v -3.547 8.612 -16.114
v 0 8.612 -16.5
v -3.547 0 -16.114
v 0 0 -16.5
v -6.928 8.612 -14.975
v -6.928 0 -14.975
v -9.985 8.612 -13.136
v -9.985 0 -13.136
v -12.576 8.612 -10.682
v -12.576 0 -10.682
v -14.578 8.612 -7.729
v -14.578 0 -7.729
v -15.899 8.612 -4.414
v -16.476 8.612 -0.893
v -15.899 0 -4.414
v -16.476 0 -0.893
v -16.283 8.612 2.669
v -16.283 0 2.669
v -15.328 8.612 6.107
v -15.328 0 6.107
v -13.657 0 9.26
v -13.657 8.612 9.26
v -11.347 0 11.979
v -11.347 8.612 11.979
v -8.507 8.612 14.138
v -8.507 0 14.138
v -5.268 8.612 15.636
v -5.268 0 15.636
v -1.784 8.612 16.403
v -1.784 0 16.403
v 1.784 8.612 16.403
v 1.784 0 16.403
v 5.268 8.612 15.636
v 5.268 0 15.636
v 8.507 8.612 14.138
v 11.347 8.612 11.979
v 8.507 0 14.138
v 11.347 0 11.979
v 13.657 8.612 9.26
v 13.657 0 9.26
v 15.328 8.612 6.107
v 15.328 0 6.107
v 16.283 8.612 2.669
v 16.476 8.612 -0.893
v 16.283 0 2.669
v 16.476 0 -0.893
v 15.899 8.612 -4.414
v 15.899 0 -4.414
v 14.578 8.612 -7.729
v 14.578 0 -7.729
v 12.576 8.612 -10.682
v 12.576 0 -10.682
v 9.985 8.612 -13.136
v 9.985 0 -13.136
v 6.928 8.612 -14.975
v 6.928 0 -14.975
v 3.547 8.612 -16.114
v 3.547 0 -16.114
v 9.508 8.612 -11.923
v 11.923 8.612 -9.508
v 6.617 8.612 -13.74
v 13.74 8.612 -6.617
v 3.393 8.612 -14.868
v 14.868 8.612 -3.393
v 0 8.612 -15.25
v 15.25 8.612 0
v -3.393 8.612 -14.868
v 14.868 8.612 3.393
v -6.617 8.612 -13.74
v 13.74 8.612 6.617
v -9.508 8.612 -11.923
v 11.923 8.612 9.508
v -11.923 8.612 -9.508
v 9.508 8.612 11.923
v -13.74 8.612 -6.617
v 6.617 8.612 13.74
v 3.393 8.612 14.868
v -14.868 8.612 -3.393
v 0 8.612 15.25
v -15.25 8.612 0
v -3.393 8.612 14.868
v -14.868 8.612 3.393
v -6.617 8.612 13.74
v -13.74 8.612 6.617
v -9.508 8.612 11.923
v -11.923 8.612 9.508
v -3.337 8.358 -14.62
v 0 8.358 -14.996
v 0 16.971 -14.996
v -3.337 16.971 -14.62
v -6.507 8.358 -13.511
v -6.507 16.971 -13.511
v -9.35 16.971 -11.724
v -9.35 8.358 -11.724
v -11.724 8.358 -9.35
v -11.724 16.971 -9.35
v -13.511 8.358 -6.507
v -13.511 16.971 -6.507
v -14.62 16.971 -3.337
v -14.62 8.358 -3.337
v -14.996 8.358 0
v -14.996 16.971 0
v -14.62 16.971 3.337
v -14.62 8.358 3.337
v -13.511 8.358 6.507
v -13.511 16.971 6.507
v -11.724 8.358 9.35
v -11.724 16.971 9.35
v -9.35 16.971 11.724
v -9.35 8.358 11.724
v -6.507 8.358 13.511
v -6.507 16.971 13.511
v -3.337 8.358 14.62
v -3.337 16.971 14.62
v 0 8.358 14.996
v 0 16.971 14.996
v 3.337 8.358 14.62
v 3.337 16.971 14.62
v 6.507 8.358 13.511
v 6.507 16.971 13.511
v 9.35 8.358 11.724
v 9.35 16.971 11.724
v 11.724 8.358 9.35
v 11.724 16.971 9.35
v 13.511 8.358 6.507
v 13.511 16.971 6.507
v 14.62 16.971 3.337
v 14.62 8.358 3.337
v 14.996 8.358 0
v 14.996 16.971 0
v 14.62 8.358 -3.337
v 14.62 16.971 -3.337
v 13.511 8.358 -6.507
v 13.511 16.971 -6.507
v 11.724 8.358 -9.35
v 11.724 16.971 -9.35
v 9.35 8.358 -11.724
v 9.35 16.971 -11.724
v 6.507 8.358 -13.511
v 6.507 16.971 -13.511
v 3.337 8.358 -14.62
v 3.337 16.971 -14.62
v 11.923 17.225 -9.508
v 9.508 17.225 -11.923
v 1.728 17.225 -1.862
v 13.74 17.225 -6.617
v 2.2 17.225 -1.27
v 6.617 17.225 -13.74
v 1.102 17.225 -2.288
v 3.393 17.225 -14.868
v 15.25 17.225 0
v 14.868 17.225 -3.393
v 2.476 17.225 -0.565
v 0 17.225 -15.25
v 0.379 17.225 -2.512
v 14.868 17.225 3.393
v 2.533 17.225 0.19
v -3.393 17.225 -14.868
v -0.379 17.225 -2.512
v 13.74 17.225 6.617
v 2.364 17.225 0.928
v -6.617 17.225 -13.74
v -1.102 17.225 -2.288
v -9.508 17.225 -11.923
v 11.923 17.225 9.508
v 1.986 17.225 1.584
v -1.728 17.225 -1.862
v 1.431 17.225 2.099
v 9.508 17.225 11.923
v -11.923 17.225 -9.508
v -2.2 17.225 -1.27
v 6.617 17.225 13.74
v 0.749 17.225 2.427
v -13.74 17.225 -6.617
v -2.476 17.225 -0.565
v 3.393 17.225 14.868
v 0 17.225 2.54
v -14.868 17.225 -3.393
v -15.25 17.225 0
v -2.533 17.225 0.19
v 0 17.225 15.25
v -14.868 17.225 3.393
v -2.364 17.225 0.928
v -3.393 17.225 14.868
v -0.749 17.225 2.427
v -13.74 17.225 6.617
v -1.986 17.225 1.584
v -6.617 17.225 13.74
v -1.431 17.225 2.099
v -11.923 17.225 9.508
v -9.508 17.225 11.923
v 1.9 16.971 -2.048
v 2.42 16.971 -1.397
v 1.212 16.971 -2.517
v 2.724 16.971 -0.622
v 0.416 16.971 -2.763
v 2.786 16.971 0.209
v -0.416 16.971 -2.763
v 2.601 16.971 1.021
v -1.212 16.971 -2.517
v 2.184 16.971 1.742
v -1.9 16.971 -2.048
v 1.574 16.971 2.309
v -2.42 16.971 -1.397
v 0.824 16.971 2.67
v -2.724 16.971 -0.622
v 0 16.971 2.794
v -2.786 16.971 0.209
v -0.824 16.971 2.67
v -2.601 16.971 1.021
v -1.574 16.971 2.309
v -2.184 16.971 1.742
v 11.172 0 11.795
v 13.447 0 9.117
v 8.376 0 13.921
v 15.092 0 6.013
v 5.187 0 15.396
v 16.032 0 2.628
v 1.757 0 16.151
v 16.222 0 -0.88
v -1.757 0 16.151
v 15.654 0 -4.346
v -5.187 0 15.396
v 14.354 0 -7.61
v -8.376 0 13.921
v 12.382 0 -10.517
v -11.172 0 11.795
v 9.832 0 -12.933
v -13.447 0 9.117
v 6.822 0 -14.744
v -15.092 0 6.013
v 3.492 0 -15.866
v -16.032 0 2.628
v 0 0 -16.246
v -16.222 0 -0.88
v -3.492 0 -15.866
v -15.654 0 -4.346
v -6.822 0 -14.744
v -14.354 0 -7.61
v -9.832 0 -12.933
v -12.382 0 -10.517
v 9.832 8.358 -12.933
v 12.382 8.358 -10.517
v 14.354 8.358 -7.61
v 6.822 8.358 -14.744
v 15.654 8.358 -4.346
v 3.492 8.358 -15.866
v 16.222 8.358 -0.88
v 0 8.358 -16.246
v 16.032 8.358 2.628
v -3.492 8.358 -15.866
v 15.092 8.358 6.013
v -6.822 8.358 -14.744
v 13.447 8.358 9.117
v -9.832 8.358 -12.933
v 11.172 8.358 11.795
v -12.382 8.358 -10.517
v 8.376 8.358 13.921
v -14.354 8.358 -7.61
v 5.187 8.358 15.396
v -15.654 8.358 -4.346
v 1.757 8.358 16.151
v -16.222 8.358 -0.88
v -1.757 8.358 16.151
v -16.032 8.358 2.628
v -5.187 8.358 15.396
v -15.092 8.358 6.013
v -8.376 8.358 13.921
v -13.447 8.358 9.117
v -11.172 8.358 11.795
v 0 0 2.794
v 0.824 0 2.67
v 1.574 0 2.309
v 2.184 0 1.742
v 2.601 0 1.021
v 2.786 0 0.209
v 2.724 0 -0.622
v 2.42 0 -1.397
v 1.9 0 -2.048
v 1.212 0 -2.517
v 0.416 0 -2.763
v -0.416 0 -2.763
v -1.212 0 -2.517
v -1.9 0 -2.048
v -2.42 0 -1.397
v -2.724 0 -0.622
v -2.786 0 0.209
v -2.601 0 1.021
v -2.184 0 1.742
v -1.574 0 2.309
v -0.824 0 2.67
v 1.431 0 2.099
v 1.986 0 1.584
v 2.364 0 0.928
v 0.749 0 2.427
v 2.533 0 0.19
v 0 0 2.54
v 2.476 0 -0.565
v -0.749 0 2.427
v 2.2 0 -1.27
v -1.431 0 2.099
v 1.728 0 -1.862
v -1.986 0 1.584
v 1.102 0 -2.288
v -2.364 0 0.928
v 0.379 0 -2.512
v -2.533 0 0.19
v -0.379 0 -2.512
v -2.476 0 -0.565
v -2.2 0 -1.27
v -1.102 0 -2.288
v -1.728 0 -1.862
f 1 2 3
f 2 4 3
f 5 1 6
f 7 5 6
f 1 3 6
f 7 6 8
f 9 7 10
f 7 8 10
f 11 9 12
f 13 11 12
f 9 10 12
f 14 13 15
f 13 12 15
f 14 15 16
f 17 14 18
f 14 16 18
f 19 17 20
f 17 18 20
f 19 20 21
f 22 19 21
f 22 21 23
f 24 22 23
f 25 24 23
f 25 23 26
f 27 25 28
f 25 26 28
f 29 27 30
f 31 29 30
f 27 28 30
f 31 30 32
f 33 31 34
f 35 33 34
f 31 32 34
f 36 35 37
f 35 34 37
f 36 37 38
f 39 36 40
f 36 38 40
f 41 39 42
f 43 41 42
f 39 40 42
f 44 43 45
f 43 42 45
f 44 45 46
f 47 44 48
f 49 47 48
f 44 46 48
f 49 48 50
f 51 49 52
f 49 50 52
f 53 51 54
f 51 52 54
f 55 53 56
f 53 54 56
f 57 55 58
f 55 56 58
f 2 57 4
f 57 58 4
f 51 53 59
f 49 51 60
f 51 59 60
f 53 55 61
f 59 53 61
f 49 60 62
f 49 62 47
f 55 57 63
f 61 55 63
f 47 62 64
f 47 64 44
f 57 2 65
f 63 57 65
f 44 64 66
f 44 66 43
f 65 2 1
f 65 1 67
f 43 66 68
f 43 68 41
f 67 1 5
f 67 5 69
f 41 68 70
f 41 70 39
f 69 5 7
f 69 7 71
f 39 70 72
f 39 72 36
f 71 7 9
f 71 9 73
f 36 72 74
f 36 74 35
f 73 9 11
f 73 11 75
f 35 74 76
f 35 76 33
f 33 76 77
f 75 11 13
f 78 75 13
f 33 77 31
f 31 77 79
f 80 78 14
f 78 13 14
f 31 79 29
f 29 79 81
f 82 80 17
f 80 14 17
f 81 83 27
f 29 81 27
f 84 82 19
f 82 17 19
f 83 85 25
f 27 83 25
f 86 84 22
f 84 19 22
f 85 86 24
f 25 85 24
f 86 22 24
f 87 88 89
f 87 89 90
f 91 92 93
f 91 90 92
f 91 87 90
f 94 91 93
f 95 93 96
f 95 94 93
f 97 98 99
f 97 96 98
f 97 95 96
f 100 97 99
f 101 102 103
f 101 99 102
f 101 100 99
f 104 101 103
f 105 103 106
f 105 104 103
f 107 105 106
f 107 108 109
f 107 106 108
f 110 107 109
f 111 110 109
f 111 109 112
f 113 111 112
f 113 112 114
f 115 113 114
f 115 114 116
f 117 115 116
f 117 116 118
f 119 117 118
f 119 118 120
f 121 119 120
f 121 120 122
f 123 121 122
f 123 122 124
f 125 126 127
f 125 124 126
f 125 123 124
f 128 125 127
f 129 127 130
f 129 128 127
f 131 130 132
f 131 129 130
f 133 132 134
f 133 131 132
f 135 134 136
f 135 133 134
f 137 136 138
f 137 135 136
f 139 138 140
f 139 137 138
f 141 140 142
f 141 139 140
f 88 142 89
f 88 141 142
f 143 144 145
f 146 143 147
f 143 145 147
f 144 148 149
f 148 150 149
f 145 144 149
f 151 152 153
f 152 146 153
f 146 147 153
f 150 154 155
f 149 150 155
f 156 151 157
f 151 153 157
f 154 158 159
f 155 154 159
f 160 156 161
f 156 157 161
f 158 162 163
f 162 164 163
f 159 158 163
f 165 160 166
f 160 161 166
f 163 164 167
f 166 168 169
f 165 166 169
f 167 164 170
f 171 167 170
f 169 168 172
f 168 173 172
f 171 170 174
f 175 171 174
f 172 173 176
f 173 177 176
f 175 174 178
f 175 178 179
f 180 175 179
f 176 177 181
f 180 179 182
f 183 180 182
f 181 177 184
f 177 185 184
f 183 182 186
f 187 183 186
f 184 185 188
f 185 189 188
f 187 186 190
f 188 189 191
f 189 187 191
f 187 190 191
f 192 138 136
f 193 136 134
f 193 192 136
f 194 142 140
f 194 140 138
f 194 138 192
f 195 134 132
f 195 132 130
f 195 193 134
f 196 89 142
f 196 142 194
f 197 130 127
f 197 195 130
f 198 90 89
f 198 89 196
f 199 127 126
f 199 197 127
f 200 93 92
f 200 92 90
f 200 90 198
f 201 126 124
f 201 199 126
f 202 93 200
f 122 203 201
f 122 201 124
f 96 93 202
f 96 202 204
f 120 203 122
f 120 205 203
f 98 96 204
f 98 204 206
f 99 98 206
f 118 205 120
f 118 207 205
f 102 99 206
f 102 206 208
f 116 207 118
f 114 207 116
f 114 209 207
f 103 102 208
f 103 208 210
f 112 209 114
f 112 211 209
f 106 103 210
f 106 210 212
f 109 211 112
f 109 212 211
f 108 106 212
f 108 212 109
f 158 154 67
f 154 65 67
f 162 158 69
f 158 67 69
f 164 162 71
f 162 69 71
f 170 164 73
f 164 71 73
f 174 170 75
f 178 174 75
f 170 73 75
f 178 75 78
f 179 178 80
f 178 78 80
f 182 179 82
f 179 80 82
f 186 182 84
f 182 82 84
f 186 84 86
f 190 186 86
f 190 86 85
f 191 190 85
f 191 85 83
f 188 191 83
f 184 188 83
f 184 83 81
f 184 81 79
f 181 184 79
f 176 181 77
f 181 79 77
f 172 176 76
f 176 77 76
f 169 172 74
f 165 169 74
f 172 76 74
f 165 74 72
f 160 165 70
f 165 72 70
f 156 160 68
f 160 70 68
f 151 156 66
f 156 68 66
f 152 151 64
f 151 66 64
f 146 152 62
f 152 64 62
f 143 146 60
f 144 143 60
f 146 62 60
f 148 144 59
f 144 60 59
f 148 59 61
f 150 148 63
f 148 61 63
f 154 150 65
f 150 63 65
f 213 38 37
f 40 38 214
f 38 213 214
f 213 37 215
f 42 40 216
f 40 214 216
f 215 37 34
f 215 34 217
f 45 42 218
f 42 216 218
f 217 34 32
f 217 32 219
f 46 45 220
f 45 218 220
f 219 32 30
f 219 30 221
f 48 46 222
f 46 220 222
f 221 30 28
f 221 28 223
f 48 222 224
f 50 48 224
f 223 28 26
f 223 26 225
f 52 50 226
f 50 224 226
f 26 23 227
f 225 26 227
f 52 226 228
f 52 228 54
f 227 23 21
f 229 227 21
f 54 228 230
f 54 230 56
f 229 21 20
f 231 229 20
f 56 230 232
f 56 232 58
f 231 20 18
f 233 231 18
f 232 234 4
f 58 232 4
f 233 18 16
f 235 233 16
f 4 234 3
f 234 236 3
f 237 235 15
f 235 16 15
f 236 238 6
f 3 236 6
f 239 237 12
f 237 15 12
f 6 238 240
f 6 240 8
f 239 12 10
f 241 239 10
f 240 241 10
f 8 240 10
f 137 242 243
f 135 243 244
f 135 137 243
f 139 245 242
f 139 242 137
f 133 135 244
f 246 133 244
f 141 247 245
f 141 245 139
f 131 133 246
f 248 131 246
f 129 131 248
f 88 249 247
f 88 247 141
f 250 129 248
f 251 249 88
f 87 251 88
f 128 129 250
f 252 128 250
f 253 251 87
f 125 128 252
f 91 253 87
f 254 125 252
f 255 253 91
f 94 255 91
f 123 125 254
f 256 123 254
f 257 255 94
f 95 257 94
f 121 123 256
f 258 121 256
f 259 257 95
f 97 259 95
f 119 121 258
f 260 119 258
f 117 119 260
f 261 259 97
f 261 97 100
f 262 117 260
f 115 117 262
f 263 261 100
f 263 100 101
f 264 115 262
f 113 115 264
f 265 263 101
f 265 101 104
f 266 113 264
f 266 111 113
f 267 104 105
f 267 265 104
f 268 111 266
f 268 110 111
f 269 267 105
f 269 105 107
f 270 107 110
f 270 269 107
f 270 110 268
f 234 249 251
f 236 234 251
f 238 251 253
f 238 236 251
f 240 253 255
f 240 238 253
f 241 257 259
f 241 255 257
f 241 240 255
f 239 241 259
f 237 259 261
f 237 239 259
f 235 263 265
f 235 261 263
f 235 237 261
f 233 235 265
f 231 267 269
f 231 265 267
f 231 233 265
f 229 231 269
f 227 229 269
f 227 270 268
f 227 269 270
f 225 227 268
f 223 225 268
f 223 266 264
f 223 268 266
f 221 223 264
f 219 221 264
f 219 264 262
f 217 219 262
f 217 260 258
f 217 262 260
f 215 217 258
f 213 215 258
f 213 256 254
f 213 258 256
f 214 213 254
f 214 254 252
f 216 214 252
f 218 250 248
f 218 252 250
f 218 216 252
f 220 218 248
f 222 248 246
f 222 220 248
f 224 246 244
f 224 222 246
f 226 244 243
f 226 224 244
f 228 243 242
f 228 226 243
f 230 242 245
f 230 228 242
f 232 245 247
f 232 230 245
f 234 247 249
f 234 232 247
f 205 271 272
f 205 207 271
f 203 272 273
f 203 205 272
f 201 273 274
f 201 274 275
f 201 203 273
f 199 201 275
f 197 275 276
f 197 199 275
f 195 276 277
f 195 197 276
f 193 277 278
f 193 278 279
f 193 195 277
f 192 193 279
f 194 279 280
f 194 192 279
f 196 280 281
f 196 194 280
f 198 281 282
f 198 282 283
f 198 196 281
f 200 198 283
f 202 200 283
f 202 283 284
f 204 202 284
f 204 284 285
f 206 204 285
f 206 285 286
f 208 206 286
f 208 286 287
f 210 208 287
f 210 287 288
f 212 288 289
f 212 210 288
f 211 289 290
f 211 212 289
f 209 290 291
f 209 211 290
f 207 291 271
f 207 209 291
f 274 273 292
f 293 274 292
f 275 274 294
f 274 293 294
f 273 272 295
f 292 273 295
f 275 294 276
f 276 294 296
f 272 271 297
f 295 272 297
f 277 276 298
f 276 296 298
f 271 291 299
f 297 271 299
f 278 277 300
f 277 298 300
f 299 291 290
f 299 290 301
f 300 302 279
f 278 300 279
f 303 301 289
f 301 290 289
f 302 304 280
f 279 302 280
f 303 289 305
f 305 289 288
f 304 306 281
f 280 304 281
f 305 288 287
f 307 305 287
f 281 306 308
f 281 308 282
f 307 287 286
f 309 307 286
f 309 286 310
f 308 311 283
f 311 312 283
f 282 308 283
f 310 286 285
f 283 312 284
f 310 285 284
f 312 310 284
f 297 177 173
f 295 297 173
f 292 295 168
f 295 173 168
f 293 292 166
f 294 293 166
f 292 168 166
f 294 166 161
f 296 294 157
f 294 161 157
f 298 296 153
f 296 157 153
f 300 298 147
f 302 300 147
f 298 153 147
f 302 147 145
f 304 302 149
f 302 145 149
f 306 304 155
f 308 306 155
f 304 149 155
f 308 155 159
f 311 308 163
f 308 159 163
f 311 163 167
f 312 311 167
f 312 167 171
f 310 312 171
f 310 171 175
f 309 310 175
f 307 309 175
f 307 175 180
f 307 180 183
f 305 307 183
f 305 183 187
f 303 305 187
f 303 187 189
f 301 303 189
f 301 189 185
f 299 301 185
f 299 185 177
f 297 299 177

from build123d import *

# Parameters (mm, degrees)
SKETCH2_R          = 2.54
CUT_EXTRUDE1_DEPTH = 30.003356194
SHELL2_T           = -0.254


with BuildPart() as part:
    # Sketch1 → Revolve1 (revolve)
    with BuildSketch(Plane.XY, mode=Mode.PRIVATE) as revolve1_sk:
        Polygon((0, 0), (0, 17.224827156), (15.25, 17.224827156), (15.25, 8.612413578), (16.5, 8.612413578), (16.5, 0), align=None)
    revolve(revolve1_sk.sketch.rotate(Axis((0, 0, 0), (0, 1, 0)), 90), axis=Axis((0, 0, 0), (0, 1, 0)))

    # Sketch2 → Cut-Extrude1 (cut, through all)
    with BuildSketch(Plane(origin=(0, 17.224827156, 0), x_dir=(1, 0, 0), z_dir=(0, 1, 0))):
        with Locations(Location((0, 0, 0), (0, 0, 270))):
            Circle(SKETCH2_R)
    extrude(amount=-CUT_EXTRUDE1_DEPTH, mode=Mode.SUBTRACT)

    # Shell2
    shell2_openings = [part.faces().sort_by_distance(p)[0] for p in [
        (0, 0, 16.033309524),
    ]]
    offset(amount=SHELL2_T, openings=shell2_openings, kind=Kind.INTERSECTION)


solid = part.part
